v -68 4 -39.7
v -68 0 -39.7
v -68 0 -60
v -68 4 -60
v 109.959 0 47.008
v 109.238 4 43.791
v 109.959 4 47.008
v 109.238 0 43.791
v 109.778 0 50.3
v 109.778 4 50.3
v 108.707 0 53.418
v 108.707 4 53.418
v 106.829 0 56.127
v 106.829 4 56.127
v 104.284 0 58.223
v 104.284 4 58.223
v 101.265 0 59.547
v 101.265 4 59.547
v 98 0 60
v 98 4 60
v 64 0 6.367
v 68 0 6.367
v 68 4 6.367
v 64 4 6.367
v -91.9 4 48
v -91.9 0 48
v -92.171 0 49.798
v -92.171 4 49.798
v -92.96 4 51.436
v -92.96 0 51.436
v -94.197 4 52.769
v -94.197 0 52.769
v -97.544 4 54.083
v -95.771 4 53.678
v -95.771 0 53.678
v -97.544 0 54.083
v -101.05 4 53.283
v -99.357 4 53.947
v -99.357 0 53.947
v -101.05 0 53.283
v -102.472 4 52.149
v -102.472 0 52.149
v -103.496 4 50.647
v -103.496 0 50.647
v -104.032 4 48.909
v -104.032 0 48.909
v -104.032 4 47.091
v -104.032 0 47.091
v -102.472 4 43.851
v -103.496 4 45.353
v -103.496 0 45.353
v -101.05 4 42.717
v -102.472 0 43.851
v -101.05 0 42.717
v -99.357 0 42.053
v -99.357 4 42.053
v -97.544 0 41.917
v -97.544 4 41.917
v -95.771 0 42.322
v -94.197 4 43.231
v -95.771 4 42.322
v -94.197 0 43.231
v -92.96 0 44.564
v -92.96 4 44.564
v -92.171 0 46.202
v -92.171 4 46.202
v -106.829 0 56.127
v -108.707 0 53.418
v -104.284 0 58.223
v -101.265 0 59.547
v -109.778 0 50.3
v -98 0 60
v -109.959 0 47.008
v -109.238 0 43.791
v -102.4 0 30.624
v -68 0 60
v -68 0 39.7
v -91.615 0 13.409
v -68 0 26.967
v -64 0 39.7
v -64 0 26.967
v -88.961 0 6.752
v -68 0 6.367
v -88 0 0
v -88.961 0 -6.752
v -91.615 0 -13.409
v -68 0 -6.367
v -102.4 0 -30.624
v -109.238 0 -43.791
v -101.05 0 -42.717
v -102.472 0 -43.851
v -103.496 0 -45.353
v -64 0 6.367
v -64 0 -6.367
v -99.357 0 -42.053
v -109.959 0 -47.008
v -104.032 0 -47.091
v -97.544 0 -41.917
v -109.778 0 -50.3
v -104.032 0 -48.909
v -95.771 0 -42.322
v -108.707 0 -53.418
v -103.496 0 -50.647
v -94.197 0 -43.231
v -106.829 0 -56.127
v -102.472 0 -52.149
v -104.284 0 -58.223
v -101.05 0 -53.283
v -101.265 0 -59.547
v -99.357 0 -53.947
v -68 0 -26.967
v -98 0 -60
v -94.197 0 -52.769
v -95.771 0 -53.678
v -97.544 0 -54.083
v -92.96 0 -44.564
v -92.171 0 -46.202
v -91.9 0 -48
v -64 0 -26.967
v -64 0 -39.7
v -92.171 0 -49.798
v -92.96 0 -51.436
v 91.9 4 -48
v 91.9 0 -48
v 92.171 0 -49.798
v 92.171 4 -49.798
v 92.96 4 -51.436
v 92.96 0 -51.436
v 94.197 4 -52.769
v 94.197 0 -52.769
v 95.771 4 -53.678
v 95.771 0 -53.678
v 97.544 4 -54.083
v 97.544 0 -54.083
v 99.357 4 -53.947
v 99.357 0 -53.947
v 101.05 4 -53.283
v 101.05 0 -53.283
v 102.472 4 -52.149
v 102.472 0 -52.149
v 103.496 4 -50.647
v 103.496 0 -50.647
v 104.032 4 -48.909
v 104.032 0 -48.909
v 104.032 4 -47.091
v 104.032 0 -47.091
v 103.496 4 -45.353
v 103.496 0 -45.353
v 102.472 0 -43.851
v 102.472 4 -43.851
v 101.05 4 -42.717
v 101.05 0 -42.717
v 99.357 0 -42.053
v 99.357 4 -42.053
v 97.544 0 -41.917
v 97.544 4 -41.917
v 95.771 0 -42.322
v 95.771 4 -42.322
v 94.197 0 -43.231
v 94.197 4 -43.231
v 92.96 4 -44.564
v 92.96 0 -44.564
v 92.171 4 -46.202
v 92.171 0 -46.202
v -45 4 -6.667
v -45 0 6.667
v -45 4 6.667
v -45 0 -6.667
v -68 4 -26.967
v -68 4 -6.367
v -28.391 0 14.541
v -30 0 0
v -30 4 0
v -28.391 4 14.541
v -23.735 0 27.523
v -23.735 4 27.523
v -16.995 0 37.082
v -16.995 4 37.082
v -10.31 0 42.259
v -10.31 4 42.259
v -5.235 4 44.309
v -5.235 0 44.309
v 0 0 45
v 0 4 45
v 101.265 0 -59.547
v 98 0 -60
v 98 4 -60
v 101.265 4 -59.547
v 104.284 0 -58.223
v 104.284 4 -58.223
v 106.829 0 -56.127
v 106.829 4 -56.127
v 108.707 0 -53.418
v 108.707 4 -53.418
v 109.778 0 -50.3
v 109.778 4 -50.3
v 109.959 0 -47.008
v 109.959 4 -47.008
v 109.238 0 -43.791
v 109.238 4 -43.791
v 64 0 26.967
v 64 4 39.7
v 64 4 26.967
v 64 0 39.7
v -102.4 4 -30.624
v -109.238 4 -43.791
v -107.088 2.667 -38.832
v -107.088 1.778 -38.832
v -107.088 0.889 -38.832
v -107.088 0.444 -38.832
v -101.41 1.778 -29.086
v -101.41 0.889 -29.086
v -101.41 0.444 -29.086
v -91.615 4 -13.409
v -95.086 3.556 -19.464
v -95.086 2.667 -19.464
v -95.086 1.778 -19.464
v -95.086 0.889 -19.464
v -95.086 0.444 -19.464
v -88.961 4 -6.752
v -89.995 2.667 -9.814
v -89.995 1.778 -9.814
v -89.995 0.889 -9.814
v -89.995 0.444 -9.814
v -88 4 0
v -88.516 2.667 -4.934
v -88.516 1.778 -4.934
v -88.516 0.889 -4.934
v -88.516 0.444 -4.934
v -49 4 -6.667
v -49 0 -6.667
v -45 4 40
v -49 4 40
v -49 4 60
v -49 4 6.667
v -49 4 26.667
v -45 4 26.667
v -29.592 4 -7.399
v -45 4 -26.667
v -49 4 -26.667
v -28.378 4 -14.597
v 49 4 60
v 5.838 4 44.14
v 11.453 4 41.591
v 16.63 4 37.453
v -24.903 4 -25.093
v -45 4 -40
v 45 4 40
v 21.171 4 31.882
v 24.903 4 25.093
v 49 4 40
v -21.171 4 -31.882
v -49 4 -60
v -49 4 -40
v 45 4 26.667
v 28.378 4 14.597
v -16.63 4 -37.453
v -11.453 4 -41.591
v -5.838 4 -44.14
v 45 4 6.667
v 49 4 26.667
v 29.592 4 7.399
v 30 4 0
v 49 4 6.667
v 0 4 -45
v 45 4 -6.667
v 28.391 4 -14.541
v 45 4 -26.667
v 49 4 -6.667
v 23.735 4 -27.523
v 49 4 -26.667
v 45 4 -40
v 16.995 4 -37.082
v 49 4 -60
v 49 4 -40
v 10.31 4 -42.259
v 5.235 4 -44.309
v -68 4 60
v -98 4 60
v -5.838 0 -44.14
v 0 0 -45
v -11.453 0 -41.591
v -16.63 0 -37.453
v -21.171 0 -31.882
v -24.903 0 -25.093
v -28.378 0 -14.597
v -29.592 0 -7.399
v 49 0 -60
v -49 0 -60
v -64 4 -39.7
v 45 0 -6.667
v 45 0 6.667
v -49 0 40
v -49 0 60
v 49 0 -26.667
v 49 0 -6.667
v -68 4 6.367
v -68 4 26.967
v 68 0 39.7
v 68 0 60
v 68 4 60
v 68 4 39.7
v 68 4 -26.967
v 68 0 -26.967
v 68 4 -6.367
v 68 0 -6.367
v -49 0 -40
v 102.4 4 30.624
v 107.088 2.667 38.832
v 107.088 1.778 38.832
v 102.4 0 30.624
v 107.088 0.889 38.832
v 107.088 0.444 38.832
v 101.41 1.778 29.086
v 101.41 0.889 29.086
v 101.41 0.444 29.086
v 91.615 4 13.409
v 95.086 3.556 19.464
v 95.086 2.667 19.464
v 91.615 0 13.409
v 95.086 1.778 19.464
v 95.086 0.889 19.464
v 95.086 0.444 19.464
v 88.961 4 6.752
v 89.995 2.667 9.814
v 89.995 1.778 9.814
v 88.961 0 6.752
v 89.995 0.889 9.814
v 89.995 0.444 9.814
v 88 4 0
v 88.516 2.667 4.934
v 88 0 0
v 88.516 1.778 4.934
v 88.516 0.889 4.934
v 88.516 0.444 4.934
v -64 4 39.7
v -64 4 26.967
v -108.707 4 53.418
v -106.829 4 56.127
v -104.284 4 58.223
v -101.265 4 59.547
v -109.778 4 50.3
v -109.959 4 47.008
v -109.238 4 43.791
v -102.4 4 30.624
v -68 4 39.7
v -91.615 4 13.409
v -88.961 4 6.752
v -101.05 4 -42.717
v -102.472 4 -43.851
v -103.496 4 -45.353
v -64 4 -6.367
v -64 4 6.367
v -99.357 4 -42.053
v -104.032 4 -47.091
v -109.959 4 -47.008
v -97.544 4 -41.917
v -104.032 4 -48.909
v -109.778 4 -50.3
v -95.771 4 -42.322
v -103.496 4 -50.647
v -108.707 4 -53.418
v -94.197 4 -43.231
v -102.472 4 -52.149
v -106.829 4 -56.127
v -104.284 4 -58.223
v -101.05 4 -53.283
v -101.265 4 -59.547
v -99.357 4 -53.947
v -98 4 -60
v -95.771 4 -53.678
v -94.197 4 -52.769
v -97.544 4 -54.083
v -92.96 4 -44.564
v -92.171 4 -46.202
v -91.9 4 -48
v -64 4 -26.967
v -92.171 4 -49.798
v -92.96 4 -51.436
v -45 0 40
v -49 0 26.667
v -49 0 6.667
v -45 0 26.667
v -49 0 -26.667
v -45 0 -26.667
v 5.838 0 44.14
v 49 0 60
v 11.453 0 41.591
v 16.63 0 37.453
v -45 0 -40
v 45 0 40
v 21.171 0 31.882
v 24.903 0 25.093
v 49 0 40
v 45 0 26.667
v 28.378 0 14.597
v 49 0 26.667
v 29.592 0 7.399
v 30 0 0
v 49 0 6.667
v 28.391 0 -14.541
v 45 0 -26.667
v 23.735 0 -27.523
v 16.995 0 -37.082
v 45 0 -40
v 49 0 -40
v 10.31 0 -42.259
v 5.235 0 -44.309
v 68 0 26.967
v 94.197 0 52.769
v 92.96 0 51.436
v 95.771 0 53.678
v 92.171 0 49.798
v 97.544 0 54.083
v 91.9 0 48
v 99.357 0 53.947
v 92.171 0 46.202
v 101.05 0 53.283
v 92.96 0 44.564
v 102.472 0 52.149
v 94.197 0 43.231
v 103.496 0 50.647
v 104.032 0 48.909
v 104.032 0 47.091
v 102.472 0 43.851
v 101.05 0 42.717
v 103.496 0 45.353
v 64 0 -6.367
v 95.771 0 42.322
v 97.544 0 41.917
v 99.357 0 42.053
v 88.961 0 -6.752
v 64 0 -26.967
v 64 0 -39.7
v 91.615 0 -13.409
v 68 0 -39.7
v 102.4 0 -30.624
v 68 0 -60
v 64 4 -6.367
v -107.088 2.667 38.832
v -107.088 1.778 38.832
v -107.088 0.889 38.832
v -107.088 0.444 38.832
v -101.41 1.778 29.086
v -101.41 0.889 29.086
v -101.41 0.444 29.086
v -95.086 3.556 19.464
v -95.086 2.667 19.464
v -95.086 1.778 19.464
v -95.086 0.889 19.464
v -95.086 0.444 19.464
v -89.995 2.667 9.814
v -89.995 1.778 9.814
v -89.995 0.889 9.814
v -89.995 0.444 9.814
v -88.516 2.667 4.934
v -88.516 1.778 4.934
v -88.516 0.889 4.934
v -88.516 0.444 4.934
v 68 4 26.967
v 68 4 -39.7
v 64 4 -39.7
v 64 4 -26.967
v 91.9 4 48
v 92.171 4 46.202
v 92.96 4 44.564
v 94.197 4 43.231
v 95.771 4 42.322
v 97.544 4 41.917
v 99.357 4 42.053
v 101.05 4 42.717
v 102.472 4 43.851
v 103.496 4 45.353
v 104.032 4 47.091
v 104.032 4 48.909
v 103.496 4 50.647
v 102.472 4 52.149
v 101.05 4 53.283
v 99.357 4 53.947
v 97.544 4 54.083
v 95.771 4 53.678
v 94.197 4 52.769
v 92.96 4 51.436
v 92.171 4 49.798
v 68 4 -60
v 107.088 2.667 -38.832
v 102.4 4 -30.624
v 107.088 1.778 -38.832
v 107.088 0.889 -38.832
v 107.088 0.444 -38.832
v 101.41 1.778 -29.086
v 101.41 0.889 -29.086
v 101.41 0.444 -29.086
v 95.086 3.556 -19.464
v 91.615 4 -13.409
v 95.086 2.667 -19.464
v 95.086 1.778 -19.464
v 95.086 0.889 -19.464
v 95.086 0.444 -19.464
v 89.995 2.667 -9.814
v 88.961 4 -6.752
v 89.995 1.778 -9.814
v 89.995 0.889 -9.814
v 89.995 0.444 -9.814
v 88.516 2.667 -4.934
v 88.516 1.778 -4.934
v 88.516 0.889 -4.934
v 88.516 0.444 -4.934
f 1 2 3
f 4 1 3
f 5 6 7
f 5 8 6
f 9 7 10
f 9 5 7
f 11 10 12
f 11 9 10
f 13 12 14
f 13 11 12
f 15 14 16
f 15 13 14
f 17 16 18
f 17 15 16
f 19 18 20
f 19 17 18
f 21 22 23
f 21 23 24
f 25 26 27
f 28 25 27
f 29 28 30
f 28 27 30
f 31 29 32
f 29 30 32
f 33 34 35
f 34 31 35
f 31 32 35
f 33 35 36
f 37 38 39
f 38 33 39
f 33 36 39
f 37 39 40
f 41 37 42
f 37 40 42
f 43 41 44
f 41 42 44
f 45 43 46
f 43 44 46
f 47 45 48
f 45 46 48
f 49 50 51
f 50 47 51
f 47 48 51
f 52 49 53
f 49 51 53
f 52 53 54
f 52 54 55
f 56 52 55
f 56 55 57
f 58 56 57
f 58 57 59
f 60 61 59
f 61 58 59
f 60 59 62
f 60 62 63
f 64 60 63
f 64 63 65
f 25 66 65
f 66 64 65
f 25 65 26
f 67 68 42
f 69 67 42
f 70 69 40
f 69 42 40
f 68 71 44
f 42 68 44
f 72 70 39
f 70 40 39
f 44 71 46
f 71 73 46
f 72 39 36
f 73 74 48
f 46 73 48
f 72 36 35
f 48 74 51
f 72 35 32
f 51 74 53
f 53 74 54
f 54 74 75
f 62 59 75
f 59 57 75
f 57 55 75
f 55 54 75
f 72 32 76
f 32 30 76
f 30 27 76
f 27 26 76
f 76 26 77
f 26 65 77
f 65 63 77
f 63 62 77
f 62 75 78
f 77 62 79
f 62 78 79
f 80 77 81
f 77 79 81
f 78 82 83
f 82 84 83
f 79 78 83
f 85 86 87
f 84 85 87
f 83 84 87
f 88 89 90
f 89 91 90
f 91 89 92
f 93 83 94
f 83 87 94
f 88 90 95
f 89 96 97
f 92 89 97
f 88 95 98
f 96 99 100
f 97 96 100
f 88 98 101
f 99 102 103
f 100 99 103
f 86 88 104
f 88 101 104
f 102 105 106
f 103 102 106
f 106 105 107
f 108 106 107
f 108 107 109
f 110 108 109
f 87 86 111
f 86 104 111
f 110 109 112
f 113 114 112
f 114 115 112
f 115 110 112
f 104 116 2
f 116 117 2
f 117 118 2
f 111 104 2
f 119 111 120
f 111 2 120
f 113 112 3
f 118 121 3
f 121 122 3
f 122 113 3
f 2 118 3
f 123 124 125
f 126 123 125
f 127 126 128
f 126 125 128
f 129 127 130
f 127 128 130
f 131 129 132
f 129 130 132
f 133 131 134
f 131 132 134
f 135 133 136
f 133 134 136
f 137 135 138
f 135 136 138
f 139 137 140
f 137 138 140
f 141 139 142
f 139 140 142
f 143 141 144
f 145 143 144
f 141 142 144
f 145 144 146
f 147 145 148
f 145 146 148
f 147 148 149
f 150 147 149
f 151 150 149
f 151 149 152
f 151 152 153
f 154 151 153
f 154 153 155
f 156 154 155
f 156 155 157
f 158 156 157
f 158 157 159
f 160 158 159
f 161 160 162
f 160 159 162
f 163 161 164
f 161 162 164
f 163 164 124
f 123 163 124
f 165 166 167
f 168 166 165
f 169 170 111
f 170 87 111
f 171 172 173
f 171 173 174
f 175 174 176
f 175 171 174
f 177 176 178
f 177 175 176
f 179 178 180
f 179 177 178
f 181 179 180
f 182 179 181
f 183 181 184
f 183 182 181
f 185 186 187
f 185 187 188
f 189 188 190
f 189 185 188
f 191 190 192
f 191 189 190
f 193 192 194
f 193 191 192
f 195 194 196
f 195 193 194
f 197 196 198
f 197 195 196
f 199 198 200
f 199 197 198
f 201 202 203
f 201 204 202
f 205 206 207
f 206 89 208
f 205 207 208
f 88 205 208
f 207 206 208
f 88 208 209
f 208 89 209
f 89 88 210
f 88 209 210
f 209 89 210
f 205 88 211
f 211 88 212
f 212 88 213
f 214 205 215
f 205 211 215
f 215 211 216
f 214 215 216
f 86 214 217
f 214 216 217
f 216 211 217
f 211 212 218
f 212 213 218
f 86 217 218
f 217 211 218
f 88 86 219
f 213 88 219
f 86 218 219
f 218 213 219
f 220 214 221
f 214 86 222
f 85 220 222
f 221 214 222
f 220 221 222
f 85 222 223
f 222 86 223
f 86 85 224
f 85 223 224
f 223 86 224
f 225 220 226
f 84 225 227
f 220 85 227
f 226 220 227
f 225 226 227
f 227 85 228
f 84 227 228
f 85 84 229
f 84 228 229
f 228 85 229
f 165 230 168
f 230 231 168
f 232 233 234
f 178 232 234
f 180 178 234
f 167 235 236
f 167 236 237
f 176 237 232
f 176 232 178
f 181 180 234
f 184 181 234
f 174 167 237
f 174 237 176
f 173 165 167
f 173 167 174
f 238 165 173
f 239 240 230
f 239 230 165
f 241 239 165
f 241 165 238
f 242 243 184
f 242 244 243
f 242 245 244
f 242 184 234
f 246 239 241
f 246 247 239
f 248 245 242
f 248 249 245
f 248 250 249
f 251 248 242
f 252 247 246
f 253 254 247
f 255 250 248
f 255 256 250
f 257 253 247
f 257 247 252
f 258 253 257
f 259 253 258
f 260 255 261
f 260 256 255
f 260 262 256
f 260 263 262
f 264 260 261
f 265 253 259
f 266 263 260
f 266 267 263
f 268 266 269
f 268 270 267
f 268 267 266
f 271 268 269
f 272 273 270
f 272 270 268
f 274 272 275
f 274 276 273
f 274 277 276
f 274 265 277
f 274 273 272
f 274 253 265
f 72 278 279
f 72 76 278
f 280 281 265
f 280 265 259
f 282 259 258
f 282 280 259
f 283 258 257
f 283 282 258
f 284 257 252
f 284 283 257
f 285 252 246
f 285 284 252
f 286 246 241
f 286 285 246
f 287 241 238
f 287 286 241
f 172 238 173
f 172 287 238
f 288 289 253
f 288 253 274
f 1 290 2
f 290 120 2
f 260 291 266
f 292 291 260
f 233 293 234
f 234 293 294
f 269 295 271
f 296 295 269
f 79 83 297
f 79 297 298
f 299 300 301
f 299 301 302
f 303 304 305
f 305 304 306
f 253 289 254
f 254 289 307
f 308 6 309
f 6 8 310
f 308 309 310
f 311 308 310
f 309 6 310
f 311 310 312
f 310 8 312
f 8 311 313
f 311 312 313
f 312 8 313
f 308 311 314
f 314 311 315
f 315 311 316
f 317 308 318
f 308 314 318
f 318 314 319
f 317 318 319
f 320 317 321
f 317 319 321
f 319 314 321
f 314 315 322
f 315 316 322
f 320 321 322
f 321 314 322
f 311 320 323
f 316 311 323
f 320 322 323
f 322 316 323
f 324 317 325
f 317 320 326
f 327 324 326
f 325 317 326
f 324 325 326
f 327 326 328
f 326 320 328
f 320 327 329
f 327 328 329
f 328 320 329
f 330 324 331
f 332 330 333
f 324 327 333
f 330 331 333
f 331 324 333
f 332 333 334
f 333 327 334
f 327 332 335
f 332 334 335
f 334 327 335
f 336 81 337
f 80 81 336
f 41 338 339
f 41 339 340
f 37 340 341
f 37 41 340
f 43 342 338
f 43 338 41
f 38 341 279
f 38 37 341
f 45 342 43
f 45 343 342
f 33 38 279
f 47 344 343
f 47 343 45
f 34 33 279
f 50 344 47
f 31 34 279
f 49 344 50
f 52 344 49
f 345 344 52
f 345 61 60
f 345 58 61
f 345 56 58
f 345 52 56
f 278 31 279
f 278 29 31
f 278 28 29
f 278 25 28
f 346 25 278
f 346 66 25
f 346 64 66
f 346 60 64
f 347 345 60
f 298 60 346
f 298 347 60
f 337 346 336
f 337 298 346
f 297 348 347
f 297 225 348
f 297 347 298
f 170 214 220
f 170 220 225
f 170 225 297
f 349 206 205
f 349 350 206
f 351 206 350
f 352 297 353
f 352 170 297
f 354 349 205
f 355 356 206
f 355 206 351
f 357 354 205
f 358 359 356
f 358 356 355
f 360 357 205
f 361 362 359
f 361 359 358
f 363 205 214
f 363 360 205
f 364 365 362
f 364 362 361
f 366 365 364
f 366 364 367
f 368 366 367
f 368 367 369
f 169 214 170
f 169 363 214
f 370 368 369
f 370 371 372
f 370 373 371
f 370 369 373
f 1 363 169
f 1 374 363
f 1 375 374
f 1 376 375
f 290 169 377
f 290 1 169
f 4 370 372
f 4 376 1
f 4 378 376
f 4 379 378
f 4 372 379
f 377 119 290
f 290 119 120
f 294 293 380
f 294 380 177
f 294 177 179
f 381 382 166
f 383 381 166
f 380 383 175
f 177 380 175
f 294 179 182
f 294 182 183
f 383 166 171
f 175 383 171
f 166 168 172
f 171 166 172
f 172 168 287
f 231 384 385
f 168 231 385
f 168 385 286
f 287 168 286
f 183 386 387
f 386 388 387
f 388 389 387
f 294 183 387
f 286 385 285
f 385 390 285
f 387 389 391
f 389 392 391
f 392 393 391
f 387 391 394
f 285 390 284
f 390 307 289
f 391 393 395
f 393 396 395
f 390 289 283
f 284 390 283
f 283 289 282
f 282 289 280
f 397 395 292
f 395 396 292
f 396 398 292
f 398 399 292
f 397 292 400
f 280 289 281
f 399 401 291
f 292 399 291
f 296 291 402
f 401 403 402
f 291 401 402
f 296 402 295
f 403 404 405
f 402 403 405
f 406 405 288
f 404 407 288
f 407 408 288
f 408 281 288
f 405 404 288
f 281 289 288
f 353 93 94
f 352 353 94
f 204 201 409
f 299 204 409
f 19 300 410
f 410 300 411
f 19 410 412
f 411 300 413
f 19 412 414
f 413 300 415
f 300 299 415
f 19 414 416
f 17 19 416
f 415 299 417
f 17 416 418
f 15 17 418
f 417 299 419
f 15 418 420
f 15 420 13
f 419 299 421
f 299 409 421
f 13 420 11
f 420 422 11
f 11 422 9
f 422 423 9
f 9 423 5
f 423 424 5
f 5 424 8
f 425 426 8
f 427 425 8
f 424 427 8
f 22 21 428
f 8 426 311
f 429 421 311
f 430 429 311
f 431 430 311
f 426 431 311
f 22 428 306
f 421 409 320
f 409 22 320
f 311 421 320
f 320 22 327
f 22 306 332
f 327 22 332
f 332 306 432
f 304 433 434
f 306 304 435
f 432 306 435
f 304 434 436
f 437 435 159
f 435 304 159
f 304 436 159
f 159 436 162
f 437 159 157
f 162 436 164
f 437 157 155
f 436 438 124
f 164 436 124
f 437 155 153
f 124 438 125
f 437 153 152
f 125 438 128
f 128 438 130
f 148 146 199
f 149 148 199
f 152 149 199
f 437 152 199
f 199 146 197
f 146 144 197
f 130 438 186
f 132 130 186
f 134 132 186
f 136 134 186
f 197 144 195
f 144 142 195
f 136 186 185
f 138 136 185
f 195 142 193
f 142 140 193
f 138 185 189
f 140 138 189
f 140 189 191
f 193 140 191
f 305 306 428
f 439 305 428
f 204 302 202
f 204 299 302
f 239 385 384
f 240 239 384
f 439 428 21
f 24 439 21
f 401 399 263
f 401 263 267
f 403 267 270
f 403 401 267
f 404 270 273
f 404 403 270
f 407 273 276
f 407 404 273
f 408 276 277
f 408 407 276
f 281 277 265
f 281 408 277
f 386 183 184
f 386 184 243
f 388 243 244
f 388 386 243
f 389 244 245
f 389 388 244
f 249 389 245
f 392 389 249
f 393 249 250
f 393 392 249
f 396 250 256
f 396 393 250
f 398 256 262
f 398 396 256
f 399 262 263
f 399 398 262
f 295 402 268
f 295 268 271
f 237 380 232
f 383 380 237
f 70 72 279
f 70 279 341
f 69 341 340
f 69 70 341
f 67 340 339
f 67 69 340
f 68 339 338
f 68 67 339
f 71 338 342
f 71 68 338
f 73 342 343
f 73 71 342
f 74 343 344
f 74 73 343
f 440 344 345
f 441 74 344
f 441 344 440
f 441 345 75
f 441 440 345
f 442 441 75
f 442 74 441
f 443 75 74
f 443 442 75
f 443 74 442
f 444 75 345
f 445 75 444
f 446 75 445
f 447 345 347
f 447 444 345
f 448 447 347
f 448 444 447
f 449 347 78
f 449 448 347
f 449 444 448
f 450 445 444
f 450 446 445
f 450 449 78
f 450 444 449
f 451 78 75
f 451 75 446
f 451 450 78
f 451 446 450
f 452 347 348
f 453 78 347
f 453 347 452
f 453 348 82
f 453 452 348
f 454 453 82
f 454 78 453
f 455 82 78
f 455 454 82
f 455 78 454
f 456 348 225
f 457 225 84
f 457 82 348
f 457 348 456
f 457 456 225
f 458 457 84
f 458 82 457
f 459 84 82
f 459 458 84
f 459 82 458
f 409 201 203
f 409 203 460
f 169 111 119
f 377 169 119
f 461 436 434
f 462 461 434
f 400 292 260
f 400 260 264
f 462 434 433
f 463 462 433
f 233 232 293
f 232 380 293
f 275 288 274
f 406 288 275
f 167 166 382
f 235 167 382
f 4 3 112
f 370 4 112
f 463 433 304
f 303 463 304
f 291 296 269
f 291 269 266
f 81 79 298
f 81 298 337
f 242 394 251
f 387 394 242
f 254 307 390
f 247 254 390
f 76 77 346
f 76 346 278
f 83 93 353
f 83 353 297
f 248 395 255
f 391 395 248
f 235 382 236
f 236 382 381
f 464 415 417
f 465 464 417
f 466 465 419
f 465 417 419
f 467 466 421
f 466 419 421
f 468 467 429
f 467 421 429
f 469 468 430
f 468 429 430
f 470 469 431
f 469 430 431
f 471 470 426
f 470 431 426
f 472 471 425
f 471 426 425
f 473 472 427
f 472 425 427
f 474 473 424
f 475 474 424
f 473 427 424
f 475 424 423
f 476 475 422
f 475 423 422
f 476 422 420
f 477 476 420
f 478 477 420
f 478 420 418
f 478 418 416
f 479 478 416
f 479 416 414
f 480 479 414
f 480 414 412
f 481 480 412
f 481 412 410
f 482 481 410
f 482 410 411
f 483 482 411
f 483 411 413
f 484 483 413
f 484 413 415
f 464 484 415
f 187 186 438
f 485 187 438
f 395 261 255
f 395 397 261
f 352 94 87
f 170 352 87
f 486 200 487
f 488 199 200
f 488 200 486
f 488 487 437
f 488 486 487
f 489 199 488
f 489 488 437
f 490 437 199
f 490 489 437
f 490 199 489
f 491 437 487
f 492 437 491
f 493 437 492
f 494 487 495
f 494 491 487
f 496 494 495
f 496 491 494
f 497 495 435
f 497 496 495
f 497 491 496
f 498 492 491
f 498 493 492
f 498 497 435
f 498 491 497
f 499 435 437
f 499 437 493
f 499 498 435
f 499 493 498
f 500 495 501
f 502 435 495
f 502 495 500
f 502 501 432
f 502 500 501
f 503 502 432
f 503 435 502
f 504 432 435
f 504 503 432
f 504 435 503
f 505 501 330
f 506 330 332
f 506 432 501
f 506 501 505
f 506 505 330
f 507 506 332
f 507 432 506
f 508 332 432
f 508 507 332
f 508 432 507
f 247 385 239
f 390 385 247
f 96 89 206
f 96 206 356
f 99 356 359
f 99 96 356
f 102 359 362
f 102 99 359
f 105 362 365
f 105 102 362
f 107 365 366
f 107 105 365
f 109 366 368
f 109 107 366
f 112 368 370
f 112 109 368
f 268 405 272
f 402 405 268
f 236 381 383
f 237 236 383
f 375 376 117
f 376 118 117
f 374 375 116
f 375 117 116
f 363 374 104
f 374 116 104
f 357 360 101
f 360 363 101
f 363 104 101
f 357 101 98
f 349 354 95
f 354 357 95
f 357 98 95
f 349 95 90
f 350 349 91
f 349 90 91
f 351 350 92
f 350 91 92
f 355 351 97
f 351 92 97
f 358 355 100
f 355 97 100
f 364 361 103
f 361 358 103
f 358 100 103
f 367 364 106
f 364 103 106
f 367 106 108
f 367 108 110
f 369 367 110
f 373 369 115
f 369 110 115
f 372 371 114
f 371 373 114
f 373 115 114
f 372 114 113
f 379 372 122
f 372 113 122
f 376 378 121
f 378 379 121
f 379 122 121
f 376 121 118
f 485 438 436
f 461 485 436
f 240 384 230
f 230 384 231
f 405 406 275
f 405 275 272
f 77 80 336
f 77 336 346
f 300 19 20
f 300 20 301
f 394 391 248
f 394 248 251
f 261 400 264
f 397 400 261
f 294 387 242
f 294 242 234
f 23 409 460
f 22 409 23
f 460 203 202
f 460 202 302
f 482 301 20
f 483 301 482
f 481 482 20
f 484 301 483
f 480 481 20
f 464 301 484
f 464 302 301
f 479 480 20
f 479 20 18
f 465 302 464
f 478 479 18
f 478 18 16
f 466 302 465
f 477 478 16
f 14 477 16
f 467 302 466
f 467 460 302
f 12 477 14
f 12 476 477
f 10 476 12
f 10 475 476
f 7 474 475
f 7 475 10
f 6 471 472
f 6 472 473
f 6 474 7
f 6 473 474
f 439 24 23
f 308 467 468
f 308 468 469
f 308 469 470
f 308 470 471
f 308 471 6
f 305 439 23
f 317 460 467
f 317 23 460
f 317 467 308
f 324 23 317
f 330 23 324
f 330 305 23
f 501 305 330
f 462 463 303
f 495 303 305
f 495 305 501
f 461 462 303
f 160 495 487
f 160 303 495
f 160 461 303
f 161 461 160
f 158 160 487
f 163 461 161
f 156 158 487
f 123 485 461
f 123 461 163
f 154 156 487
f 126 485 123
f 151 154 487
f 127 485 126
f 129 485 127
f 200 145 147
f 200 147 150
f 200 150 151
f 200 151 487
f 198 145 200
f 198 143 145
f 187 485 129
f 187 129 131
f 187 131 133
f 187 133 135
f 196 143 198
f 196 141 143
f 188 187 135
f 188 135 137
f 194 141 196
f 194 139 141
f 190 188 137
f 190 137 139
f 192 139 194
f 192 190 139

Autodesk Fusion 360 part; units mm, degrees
sketch "Skizze1" plane through (0, 0, 0) normal (0, 1, 0) x (1, 0, 0)
  line L0 (-45, 60) -> (45, 60)
  line L1 (45, 60) -> (45, -60)
  line L2 (45, -60) -> (-45, -60)
  line L3 (-45, -60) -> (-45, 60)
  line L4 (-45, 60) -> (45, -60) construction
  line L5 (45, 60) -> (-45, -60) construction
  line L6 (-45, 60) -> (-49, 60)
  line L7 (-49, 60) -> (-49, 40)
  line L8 (-49, 40) -> (-45, 40)
  line L9 (-45, 40) -> (-45, 60)
  line L10 (-49, 26.6667) -> (-49, 6.6667)
  line L11 (-45, 6.6667) -> (-45, 26.6667)
  line L12 (-45, 26.6667) -> (-49, 26.6667)
  line L13 (-49, 6.6667) -> (-45, 6.6667)
  line L14 (-49, -6.6667) -> (-49, -26.6667)
  line L15 (-45, -26.6667) -> (-45, -6.6667)
  line L16 (-45, -6.6667) -> (-49, -6.6667)
  line L17 (-49, -26.6667) -> (-45, -26.6667)
  line L18 (-49, -40) -> (-49, -60)
  line L19 (-45, -60) -> (-45, -40)
  line L20 (-45, -40) -> (-49, -40)
  line L21 (-49, -60) -> (-45, -60)
  line L22 (0, -1.75) -> (0, -22.5)
  line L23 (45, -40) -> (49, -40)
  line L24 (45, 60) -> (49, 60)
  line L25 (45, 6.6667) -> (45, 26.6667)
  line L26 (49, -26.6667) -> (45, -26.6667)
  line L27 (49, 40) -> (45, 40)
  line L28 (49, -60) -> (45, -60)
  line L29 (45, -60) -> (45, -40)
  line L30 (45, -60) -> (45, 60)
  line L31 (45, 26.6667) -> (49, 26.6667)
  line L32 (49, 6.6667) -> (45, 6.6667)
  line L33 (49, -6.6667) -> (49, -26.6667)
  line L34 (49, 60) -> (49, 40)
  line L35 (45, -6.6667) -> (49, -6.6667)
  line L36 (49, -40) -> (49, -60)
  line L37 (45, -26.6667) -> (45, -6.6667)
  line L38 (45, 40) -> (45, 60)
  line L39 (49, 26.6667) -> (49, 6.6667)
  ellipse E0 centre (0, 0) end of major axis (0, -45) minor radius 30
  line L40 (0, 45) -> (0, -45)
  line L41 (-30, 0) -> (30, 0)
  dimension "d1" = 90
  dimension "d2" = 120
  dimension "d3" = 4
  dimension "d4" = 20
  dimension "d7" = 0
  dimension "d8" = -100
  dimension "d9" = 60
  dimension "d10" = 45
extrude "Extrusion1" add sketch "Skizze1" along normal blind 4 makes body 1
sketch "Skizze2" plane through (0, 0, 0) normal (0, 1, 0) x (1, 0, 0)
  line L0 (-68, 0) -> (-68, 60)
  line L1 (-68, 60) -> (-98, 60)
  arc A0 (-98, 60) -> (-109.2376, 43.791) centre (-98, 48) ccw
  line L2 (-68, 0) -> (-88, 0)
  spline S0 degree 5 poles (-109.2376, 43.791) (-108.5645, 41.9938) (-107.0336, 38.4213) (-104.1836, 33.1279) (-99.539, 26.1758) (-93.573, 17.5532) (-89.8635, 10.6152) (-88.339, 5.3417) (-88, 1.7871) (-88, 0) knots 0 0 0 0 0 0 0.2 0.4 0.6 0.8 1 1 1 1 1 1
  line L3 (-111.0492, 48.6279) -> (-107.4261, 38.9542)
  line L4 (-88, 4.59) -> (-88, -4.59)
  line L5 (49, 60) -> (-49, 60)
  circle A1 centre (-98, 48) radius 6.1
  line L6 (-68, 0) -> (-64, 0)
  line L7 (-64, 0) -> (-64, 6.3667)
  line L8 (-64, 6.3667) -> (-68, 6.3667)
  line L9 (-68, 6.3667) -> (-68, 0)
  line L10 (-68, 26.9667) -> (-64, 26.9667)
  line L11 (-64, 26.9667) -> (-64, 39.7)
  line L12 (-64, 39.7) -> (-68, 39.7)
  line L13 (-68, 39.7) -> (-68, 26.9667)
  line L14 (-49, 6.6667) -> (-45, 6.6667)
  line L15 (-45, 26.6667) -> (-49, 26.6667)
  line L16 (-49, 40) -> (-45, 40)
  line L17 (1.75, 0) -> (22.5, 0)
  line L18 (-64, -26.9667) -> (-64, -39.7)
  line L19 (-68, -6.3667) -> (-68, 0)
  line L20 (-64, -39.7) -> (-68, -39.7)
  line L21 (-68, -60) -> (-98, -60)
  line L22 (-111.0492, -48.6279) -> (-107.4261, -38.9542)
  line L23 (-88, -4.59) -> (-88, 4.59)
  line L24 (-68, 0) -> (-88, 0)
  line L25 (-64, 0) -> (-64, -6.3667)
  spline S1 degree 5 poles (-109.2376, -43.791) (-108.5645, -41.9938) (-107.0336, -38.4213) (-104.1836, -33.1279) (-99.539, -26.1758) (-93.573, -17.5532) (-89.8635, -10.6152) (-88.339, -5.3417) (-88, -1.7871) (-88, 0) knots 0 0 0 0 0 0 0.2 0.4 0.6 0.8 1 1 1 1 1 1
  line L26 (-111.0492, -48.6279) -> (-107.4261, -38.9542)
  line L27 (-88, -4.59) -> (-88, 4.59)
  line L28 (-68, -39.7) -> (-68, -26.9667)
  line L29 (-68, 0) -> (-68, -60)
  circle A2 centre (-98, -48) radius 6.1
  arc A3 (-109.2376, -43.791) -> (-98, -60) centre (-98, -48) ccw
  line L30 (-68, 0) -> (-64, 0)
  line L31 (-64, -6.3667) -> (-68, -6.3667)
  line L32 (-68, -26.9667) -> (-64, -26.9667)
  line L33 (-49, 60) -> (-49, 40)
  dimension "d13" = 12.2
  dimension "d14" = 12
  dimension "d15" = 20
  dimension "d18" = 30
  dimension "d19" = 4
  dimension "d20" = 0.3
  dimension "d21" = 0.3
  dimension "d22" = 0.3
  dimension "d27" = 15
extrude "Extrusion2" add sketch "Skizze2" along normal blind 4 separate body makes body 2
mirror "Spiegeln1" about plane through (0, 0, 0) normal (1, 0, 0) of bodies 2 makes body 3
equation "d21 = d20"
equation "d22 = d20"
